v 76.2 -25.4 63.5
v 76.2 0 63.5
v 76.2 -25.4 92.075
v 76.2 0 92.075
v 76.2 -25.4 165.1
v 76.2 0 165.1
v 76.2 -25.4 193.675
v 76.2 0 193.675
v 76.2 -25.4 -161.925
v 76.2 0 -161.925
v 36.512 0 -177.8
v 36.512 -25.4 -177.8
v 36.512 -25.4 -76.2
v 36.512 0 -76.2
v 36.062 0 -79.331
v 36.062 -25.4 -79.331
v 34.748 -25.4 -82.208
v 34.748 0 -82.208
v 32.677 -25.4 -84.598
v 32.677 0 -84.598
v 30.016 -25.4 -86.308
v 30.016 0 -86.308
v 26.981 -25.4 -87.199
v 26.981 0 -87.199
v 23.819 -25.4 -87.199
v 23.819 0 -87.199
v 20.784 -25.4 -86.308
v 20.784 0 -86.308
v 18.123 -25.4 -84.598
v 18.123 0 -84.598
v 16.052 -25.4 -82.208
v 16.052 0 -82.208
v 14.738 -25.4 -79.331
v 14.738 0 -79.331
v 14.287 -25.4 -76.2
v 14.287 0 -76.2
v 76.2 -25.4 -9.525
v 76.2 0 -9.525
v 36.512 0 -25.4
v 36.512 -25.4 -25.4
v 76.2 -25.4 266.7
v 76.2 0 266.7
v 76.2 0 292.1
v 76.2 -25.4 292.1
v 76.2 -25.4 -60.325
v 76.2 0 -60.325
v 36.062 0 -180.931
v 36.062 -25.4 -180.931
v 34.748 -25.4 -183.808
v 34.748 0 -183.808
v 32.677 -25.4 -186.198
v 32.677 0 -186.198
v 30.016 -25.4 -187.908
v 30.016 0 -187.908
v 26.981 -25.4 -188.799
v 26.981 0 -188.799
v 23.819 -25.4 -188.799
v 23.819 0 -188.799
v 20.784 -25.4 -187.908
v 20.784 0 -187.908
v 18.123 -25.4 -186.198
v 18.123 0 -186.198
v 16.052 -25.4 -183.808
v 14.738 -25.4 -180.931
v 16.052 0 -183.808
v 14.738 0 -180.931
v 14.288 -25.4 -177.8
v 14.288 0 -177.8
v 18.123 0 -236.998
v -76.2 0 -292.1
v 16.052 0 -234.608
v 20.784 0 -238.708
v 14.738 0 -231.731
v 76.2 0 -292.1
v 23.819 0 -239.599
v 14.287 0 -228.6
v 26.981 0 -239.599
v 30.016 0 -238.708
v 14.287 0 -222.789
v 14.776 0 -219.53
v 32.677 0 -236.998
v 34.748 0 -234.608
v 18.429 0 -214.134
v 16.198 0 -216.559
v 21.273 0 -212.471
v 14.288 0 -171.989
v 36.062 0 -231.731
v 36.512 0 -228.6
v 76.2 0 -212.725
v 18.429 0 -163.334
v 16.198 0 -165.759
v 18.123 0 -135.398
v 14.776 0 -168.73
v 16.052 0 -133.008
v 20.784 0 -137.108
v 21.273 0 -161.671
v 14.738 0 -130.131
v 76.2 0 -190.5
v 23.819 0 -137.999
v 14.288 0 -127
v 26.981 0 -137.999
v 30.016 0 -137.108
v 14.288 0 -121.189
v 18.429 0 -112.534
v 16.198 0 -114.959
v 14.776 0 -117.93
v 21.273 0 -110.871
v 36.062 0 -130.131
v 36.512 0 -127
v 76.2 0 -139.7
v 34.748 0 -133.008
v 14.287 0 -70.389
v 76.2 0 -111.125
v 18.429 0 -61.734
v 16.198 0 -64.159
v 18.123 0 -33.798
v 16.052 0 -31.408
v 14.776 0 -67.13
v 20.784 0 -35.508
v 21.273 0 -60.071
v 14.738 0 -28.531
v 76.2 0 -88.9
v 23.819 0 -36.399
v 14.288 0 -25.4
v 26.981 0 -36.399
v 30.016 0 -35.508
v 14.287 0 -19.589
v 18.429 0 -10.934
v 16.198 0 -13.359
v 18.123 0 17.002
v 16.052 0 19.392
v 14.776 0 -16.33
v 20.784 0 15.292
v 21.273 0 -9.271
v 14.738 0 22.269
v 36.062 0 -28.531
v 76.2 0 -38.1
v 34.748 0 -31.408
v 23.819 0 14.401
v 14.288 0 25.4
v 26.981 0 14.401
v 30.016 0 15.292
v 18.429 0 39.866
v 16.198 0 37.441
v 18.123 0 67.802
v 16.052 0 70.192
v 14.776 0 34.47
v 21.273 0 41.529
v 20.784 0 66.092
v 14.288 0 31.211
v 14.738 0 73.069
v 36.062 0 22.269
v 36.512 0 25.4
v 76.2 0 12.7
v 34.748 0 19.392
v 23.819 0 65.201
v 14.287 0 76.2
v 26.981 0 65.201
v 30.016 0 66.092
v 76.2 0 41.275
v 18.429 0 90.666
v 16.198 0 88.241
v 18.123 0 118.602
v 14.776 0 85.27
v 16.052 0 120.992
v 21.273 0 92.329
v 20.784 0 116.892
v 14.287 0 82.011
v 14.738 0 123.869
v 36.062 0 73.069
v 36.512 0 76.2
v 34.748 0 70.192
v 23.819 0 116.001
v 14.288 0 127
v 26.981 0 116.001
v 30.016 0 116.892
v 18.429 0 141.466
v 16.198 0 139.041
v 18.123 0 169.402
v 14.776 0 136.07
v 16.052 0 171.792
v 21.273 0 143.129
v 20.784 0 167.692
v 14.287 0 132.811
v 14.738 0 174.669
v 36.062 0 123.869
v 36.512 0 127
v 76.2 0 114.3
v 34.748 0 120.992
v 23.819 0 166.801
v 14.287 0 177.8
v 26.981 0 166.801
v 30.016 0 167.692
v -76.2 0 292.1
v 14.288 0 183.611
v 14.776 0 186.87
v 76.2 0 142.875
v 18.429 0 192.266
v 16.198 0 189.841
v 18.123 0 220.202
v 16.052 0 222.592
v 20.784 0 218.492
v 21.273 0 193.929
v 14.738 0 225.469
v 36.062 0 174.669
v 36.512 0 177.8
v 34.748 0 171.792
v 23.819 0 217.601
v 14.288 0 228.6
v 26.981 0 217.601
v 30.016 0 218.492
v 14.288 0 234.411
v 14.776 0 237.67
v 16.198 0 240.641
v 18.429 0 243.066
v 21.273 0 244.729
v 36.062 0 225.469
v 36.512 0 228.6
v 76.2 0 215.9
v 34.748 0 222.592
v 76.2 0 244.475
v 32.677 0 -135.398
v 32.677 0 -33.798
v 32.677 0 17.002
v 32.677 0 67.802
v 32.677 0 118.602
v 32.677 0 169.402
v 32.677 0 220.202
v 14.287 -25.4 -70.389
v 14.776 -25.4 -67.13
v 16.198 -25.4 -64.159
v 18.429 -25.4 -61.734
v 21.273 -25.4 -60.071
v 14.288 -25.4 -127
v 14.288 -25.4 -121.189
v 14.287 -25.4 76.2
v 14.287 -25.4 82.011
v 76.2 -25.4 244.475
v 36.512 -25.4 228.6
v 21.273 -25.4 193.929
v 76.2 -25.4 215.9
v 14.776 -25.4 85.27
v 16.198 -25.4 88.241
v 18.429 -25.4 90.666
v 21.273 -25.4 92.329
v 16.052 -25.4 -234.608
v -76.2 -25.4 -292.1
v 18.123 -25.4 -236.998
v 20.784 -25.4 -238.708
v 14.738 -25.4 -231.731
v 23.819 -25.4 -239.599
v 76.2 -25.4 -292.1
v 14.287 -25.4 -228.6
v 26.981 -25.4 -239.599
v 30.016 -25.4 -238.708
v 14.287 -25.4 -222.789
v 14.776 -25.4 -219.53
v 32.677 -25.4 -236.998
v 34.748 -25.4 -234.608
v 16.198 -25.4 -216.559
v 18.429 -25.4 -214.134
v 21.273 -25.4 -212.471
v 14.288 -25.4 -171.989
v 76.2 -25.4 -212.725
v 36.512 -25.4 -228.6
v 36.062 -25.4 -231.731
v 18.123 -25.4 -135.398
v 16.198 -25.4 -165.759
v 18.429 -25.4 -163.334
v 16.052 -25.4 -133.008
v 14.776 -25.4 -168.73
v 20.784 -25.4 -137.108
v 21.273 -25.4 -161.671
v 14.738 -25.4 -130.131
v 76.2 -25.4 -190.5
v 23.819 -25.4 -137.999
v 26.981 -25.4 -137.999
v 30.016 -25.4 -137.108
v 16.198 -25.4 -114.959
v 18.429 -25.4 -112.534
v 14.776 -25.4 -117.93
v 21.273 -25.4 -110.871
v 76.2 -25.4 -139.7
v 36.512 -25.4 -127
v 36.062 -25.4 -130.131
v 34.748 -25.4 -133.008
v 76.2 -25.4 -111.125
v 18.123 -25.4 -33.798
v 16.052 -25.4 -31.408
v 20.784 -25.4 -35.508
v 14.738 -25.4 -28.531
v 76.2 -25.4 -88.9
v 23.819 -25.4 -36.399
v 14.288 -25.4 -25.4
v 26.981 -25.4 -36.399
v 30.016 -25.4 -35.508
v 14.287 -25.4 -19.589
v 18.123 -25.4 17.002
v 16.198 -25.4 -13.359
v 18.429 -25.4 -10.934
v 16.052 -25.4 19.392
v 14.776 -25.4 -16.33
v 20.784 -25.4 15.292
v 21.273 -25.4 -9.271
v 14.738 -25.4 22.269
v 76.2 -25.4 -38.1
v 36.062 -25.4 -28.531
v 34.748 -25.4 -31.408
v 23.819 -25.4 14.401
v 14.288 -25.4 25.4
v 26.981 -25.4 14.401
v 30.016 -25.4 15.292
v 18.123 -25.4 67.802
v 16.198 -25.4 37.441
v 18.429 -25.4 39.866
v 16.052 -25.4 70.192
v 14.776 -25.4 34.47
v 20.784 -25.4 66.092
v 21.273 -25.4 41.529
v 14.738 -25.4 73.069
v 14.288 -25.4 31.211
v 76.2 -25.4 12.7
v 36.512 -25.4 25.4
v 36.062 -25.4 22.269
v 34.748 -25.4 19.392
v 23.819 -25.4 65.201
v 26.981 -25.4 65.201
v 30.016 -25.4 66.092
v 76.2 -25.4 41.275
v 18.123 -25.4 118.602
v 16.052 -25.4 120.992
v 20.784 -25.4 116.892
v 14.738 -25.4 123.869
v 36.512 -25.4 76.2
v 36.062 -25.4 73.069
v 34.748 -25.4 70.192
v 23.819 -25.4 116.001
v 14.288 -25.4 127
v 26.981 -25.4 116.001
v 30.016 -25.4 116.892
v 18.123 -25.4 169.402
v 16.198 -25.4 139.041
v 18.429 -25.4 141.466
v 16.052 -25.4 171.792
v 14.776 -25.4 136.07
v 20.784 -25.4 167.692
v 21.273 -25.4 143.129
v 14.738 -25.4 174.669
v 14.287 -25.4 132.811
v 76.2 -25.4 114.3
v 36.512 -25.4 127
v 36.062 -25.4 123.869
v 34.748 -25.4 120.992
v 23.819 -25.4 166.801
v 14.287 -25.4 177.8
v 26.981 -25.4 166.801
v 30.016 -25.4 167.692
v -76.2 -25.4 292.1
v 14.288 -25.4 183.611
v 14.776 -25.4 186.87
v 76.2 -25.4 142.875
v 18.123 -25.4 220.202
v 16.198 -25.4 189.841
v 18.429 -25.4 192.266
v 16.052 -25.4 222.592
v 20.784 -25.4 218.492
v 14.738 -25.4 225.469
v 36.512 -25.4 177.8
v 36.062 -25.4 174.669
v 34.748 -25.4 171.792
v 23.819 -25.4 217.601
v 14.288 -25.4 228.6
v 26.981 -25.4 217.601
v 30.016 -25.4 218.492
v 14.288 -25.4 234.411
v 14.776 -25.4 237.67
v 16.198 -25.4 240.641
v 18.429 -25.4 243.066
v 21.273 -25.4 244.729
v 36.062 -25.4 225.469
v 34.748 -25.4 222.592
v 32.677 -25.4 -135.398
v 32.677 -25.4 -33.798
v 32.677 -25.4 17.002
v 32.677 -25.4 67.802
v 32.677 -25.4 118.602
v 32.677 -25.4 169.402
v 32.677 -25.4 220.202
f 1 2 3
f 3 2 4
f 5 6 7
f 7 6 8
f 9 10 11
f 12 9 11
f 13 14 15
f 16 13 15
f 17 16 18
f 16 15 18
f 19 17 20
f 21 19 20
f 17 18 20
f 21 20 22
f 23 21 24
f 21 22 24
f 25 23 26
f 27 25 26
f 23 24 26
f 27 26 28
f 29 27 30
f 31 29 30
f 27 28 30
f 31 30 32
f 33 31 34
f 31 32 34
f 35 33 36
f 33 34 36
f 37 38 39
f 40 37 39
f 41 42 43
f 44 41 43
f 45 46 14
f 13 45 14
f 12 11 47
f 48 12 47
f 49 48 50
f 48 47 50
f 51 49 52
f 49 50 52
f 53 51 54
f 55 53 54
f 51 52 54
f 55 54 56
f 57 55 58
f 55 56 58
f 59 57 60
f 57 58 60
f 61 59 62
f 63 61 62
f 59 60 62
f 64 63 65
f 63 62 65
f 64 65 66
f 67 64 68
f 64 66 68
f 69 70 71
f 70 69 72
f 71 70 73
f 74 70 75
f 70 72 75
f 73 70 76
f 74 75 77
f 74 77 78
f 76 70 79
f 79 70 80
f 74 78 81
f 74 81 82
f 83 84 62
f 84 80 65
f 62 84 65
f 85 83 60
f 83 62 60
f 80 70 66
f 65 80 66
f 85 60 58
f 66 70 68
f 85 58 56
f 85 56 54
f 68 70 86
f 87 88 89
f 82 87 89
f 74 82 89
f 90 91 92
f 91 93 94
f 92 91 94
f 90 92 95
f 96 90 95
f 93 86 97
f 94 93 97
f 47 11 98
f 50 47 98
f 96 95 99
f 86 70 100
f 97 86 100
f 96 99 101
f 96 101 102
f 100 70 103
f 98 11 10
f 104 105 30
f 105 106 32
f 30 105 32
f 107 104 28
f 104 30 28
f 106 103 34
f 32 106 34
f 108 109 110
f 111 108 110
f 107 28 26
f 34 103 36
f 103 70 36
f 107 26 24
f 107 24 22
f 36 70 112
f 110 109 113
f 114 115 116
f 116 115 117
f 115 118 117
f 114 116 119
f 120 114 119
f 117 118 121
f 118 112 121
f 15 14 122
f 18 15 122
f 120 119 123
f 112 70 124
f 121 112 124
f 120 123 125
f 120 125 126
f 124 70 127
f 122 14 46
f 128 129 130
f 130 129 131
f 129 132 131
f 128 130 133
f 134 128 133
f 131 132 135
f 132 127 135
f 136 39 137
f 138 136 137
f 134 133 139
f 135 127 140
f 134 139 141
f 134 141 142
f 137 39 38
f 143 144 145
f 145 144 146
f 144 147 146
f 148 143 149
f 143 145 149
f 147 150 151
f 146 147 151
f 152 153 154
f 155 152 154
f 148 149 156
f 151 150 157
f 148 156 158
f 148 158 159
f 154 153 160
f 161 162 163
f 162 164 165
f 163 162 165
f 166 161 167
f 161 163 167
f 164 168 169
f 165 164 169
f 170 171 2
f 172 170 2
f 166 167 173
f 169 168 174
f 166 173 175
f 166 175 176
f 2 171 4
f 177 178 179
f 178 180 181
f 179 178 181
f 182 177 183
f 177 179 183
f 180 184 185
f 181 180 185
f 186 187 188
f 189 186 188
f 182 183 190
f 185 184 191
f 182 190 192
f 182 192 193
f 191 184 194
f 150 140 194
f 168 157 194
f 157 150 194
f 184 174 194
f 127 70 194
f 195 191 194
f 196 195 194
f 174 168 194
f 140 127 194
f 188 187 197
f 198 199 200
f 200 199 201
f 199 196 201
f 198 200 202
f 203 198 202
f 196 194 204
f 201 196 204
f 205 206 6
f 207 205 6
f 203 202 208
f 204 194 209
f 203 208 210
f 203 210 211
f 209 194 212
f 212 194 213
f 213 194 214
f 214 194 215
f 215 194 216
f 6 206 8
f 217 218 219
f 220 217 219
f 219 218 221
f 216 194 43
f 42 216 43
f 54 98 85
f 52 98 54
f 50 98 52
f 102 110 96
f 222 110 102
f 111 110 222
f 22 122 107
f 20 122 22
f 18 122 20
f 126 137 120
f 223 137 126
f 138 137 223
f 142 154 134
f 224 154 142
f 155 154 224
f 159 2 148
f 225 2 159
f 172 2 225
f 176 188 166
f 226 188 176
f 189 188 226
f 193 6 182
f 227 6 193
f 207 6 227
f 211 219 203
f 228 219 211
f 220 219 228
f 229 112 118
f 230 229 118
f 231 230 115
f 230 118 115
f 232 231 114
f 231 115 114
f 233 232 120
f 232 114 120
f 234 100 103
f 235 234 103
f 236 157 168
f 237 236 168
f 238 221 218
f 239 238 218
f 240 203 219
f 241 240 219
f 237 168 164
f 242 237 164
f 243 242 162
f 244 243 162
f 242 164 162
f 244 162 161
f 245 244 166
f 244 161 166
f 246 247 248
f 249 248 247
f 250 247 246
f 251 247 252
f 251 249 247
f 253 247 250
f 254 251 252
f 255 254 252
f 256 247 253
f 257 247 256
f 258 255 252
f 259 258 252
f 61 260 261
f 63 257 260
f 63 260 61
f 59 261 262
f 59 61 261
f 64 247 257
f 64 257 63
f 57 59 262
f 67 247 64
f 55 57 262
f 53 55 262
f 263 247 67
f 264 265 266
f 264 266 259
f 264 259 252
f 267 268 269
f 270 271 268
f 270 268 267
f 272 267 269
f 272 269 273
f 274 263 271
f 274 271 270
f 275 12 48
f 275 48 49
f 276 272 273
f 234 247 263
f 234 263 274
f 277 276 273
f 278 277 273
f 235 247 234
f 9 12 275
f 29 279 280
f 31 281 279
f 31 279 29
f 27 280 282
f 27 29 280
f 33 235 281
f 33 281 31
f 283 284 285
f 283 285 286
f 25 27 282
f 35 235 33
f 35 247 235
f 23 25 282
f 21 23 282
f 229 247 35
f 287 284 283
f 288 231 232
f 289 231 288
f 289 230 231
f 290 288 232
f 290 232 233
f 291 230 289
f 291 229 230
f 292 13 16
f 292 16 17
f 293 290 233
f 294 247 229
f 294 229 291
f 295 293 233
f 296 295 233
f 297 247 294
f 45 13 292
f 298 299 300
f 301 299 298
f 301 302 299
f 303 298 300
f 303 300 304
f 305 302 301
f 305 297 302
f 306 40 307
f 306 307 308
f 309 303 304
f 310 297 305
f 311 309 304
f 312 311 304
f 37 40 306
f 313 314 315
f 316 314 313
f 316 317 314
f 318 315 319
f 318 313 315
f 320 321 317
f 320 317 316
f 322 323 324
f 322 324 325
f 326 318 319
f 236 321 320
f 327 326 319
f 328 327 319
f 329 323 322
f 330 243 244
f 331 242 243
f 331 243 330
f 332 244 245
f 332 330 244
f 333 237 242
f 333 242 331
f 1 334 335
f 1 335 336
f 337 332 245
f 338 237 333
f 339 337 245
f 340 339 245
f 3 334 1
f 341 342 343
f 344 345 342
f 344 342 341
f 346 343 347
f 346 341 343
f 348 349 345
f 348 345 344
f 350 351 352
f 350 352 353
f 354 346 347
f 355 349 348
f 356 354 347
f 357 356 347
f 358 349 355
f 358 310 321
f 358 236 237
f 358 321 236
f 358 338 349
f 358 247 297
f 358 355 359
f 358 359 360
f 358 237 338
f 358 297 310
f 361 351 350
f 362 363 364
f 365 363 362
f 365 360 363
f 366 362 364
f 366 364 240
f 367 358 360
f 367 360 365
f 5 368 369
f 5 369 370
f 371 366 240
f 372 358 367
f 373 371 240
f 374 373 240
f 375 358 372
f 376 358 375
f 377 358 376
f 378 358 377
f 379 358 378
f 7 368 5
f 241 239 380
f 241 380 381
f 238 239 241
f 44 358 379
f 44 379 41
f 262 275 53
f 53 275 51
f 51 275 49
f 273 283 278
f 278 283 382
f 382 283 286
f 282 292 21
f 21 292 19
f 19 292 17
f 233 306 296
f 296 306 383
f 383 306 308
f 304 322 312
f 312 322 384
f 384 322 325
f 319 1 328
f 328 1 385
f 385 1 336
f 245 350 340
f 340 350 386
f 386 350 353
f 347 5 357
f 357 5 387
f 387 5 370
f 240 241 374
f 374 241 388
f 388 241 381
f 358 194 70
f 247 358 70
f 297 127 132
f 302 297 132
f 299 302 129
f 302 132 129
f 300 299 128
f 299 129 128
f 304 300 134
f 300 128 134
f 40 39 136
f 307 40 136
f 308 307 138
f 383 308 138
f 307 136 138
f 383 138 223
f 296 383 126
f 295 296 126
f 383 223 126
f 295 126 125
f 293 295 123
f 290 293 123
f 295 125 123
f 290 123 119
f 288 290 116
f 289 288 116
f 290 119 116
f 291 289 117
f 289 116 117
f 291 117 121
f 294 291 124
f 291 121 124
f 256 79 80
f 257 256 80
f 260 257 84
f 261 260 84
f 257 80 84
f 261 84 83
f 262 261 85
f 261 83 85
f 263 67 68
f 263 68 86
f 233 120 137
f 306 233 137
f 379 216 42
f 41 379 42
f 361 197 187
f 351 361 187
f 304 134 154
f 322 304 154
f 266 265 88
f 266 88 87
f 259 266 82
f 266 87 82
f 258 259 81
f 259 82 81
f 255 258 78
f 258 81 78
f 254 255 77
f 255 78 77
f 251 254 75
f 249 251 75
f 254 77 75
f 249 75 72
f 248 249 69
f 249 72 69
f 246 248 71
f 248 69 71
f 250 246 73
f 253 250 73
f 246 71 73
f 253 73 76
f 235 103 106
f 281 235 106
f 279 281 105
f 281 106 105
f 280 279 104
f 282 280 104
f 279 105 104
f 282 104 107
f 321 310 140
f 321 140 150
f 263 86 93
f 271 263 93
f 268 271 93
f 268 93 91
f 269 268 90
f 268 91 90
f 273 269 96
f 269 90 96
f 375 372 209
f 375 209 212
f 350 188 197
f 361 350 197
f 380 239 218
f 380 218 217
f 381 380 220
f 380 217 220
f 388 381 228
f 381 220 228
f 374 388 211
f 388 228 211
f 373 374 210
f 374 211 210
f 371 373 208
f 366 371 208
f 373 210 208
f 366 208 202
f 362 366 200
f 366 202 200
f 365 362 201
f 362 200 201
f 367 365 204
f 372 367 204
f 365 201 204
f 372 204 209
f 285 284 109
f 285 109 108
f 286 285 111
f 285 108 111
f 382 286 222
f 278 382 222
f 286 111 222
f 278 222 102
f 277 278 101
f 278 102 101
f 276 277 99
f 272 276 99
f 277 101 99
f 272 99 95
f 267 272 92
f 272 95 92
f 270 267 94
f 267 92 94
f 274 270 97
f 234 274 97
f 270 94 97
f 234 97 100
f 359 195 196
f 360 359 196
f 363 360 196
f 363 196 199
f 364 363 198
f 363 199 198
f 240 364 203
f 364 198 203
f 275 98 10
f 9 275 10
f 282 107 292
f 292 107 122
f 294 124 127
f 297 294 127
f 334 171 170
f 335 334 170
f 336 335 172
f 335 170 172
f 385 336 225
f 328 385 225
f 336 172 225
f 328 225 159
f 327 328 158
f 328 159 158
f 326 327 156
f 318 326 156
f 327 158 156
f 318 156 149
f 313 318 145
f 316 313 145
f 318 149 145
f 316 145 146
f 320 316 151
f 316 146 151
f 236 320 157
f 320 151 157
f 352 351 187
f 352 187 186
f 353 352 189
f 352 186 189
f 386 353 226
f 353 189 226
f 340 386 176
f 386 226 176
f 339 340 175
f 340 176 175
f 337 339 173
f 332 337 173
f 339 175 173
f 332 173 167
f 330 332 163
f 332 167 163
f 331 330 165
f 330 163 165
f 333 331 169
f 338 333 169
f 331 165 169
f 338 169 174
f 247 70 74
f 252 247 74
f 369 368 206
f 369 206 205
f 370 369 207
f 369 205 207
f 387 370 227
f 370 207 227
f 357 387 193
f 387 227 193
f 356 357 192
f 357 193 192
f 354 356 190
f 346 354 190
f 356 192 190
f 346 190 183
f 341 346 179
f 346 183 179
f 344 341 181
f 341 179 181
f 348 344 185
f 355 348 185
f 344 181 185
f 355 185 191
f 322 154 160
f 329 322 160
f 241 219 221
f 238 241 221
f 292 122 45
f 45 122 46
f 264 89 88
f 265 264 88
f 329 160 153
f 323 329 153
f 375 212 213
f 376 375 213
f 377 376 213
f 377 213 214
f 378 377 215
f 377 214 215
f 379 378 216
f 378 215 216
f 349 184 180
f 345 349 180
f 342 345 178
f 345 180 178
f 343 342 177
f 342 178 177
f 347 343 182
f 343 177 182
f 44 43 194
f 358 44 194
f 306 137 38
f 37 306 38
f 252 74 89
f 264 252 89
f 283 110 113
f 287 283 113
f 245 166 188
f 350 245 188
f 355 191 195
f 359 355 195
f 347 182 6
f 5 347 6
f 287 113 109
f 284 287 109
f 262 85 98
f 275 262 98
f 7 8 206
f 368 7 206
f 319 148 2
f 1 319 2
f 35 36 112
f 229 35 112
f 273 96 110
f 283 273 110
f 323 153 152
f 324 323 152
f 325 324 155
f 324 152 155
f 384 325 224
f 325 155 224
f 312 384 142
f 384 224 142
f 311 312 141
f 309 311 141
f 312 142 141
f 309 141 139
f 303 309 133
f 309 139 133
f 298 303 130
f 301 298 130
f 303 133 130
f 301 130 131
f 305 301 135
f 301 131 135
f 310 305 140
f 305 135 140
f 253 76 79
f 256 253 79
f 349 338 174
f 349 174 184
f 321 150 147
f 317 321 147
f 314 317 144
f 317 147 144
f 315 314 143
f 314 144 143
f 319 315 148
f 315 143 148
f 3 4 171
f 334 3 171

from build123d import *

# Parameters (mm, degrees)
F1_DEPTH = 25.4


with BuildPart() as f1:
    # F0 (on Front) → F1 (new body)
    with BuildSketch(Plane.XZ):
        with BuildLine():
            Line((76.2, 266.7), (76.2, 292.1))
            Line((76.2, 292.1), (-76.2, 292.1))
            Line((-76.2, 292.1), (-76.2, -292.1))
            Line((-76.2, -292.1), (76.2, -292.1))
            Line((76.2, -292.1), (76.2, -212.725))
            Line((76.2, -212.725), (36.5125, -228.6))
            ThreePointArc((36.5125, -228.6), (25.4, -239.7125), (14.2875, -228.6))
            Line((14.2875, -228.6), (14.2875, -222.788529))
            ThreePointArc((14.2875, -222.788529), (16.198103, -216.558541), (21.272921, -212.470832))
            Line((21.272921, -212.470832), (76.2, -190.5))
            Line((76.2, -190.5), (76.2, -161.925))
            Line((76.2, -161.925), (36.5125, -177.8))
            ThreePointArc((36.5125, -177.8), (25.4, -188.9125), (14.2875, -177.8))
            Line((14.2875, -177.8), (14.2875, -171.988529))
            ThreePointArc((14.2875, -171.988529), (16.198103, -165.758541), (21.272921, -161.670832))
            Line((21.272921, -161.670832), (76.2, -139.7))
            Line((76.2, -139.7), (76.2, -111.125))
            Line((76.2, -111.125), (36.5125, -127))
            ThreePointArc((36.5125, -127), (25.4, -138.1125), (14.2875, -127))
            Line((14.2875, -127), (14.2875, -121.188529))
            ThreePointArc((14.2875, -121.188529), (16.198103, -114.958541), (21.272921, -110.870832))
            Line((21.272921, -110.870832), (76.2, -88.9))
            Line((76.2, -88.9), (76.2, -60.325))
            Line((76.2, -60.325), (36.5125, -76.2))
            ThreePointArc((36.5125, -76.2), (25.4, -87.3125), (14.2875, -76.2))
            Line((14.2875, -76.2), (14.2875, -70.388529))
            ThreePointArc((14.2875, -70.388529), (16.198103, -64.158541), (21.272921, -60.070832))
            Line((21.272921, -60.070832), (76.2, -38.1))
            Line((76.2, -38.1), (76.2, -9.525))
            Line((76.2, -9.525), (36.5125, -25.4))
            ThreePointArc((36.5125, -25.4), (25.4, -36.5125), (14.2875, -25.4))
            Line((14.2875, -25.4), (14.2875, -19.588529))
            ThreePointArc((14.2875, -19.588529), (16.198103, -13.358541), (21.272921, -9.270832))
            Line((21.272921, -9.270832), (76.2, 12.7))
            Line((76.2, 12.7), (76.2, 41.275))
            Line((76.2, 41.275), (36.5125, 25.4))
            ThreePointArc((36.5125, 25.4), (25.4, 14.2875), (14.2875, 25.4))
            Line((14.2875, 25.4), (14.2875, 31.211471))
            ThreePointArc((14.2875, 31.211471), (16.198103, 37.441459), (21.272921, 41.529168))
            Line((21.272921, 41.529168), (76.2, 63.5))
            Line((76.2, 63.5), (76.2, 92.075))
            Line((76.2, 92.075), (36.5125, 76.2))
            ThreePointArc((36.5125, 76.2), (25.4, 65.0875), (14.2875, 76.2))
            Line((14.2875, 76.2), (14.2875, 82.011471))
            ThreePointArc((14.2875, 82.011471), (16.198103, 88.241459), (21.272921, 92.329168))
            Line((21.272921, 92.329168), (76.2, 114.3))
            Line((76.2, 114.3), (76.2, 142.875))
            Line((76.2, 142.875), (36.5125, 127))
            ThreePointArc((36.5125, 127), (25.4, 115.8875), (14.2875, 127))
            Line((14.2875, 127), (14.2875, 132.811471))
            ThreePointArc((14.2875, 132.811471), (16.198103, 139.041459), (21.272921, 143.129168))
            Line((21.272921, 143.129168), (76.2, 165.1))
            Line((76.2, 165.1), (76.2, 193.675))
            Line((76.2, 193.675), (36.5125, 177.8))
            ThreePointArc((36.5125, 177.8), (25.4, 166.6875), (14.2875, 177.8))
            Line((14.2875, 177.8), (14.2875, 183.611471))
            ThreePointArc((14.2875, 183.611471), (16.198103, 189.841459), (21.272921, 193.929168))
            Line((21.272921, 193.929168), (76.2, 215.9))
            Line((76.2, 215.9), (76.2, 244.475))
            Line((76.2, 244.475), (36.5125, 228.6))
            ThreePointArc((36.5125, 228.6), (25.4, 217.4875), (14.2875, 228.6))
            Line((14.2875, 228.6), (14.2875, 234.411471))
            ThreePointArc((14.2875, 234.411471), (16.198103, 240.641459), (21.272921, 244.729168))
            Line((21.272921, 244.729168), (76.2, 266.7))
        make_face()
    extrude(amount=F1_DEPTH)


solid = f1.part
